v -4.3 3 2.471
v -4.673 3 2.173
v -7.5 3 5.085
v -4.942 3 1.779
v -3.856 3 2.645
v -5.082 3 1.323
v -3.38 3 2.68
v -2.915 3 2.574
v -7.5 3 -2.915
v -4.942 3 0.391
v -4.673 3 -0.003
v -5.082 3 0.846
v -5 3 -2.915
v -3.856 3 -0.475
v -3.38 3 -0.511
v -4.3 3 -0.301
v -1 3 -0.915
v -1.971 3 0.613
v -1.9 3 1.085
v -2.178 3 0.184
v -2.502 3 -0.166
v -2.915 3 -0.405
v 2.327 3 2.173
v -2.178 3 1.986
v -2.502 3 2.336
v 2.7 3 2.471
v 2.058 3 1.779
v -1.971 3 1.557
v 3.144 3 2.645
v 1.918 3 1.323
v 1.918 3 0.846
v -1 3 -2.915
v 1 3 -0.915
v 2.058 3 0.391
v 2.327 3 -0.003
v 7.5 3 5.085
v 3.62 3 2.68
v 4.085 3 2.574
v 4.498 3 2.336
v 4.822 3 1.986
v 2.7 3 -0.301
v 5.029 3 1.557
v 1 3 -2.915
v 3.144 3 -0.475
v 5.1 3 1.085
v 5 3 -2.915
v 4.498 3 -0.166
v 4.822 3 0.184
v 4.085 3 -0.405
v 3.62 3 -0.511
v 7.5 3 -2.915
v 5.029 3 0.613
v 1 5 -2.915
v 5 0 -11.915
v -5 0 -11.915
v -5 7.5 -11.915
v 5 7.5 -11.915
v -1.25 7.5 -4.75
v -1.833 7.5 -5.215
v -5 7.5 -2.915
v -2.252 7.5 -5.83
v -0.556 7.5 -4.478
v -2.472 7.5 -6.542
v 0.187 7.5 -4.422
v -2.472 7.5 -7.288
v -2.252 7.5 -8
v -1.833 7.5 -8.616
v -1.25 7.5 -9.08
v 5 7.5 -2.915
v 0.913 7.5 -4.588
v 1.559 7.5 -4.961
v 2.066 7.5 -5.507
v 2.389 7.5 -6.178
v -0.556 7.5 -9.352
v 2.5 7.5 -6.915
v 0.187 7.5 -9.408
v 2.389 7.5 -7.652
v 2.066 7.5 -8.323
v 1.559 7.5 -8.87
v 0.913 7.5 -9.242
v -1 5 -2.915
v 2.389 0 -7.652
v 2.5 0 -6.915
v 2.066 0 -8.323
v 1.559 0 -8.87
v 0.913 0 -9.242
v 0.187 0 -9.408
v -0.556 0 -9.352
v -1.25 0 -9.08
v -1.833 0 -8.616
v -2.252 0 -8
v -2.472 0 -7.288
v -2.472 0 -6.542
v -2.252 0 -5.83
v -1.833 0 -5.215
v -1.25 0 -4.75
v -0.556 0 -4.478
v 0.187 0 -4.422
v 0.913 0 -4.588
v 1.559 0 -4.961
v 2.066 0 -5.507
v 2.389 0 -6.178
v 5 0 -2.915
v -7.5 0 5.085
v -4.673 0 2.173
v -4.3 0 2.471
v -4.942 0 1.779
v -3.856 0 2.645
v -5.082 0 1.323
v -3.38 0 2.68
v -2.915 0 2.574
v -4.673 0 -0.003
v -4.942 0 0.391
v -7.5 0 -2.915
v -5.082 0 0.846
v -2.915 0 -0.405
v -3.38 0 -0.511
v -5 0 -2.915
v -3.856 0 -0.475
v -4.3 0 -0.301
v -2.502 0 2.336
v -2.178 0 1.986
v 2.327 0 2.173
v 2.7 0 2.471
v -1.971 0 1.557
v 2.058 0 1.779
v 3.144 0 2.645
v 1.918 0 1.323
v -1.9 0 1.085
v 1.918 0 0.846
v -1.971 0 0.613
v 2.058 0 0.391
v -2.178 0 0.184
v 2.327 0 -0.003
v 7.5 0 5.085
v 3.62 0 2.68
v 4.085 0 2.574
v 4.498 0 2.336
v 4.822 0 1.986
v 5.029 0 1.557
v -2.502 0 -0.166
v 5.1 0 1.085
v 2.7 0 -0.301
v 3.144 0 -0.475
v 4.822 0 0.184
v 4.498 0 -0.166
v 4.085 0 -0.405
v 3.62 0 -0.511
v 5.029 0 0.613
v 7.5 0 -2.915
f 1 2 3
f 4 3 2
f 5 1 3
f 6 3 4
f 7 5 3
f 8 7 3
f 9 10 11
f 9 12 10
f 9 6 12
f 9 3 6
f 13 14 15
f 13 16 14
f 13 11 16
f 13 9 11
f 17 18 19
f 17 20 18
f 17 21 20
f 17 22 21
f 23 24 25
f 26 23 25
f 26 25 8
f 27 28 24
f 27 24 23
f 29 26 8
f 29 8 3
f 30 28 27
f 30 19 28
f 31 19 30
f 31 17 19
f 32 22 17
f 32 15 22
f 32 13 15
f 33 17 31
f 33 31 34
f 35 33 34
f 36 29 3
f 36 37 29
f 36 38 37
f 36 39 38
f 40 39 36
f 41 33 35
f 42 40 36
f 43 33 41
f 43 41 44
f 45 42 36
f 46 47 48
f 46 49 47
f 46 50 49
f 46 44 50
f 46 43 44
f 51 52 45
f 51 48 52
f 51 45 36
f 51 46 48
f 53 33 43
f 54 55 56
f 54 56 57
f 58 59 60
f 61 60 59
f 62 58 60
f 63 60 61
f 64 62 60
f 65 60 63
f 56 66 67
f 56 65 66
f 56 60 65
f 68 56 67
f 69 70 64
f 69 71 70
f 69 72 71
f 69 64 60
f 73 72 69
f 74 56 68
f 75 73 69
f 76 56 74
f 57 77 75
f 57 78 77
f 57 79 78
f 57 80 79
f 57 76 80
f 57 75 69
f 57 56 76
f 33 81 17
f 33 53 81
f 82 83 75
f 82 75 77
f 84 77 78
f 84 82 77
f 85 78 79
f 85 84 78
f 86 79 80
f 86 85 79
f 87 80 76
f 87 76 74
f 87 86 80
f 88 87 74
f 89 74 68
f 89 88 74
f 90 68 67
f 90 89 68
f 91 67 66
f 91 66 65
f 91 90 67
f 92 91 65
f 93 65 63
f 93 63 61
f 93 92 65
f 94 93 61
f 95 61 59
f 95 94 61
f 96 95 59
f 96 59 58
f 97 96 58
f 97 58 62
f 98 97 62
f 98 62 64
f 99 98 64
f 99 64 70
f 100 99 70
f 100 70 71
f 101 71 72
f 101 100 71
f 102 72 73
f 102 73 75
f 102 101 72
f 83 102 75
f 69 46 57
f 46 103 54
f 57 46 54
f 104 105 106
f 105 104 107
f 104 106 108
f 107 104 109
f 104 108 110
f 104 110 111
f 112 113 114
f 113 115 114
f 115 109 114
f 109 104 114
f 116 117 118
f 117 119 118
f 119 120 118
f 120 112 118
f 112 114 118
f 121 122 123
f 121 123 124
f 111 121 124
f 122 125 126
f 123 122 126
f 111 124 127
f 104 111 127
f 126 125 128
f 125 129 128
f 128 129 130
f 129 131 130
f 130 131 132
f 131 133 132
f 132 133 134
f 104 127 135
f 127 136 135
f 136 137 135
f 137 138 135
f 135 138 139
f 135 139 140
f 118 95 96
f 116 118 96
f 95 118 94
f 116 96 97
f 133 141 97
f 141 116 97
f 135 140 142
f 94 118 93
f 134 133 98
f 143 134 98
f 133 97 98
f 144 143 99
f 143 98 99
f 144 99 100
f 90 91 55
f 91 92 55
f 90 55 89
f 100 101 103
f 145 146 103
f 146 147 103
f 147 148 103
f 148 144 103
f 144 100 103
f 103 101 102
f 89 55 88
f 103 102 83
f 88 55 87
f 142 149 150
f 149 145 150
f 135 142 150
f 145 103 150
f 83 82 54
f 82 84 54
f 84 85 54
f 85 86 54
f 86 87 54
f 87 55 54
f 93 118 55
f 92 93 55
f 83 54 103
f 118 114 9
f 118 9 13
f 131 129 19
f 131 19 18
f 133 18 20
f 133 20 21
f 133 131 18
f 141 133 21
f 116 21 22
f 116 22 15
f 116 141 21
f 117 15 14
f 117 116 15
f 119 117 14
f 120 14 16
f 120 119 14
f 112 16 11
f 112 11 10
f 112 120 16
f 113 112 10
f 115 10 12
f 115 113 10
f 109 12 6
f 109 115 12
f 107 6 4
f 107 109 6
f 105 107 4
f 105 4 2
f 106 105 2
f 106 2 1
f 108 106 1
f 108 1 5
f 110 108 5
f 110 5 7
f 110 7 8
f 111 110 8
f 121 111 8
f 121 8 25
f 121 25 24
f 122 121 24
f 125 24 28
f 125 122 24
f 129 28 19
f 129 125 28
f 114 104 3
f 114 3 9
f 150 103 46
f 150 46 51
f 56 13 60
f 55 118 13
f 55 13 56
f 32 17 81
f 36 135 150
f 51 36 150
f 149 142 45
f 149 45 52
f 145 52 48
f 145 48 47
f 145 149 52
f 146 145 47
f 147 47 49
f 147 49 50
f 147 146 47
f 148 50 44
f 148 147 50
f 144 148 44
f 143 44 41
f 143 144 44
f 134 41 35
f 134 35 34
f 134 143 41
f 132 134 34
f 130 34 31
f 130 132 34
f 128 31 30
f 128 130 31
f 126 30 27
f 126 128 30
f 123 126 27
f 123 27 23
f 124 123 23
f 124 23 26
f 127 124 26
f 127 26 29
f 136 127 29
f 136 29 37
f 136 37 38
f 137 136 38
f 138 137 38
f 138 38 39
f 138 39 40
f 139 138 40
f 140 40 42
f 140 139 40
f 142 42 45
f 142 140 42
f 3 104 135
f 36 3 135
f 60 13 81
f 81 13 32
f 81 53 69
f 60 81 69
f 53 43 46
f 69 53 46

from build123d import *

# Parameters (mm, degrees)
SKETCH1_W           = 15
SKETCH1_H           = 8
SKETCH1_R           = 1.6
BOSS_EXTRUDE1_DEPTH = 3
SKETCH2_W           = 10
SKETCH2_H           = 9
SKETCH2_R           = 2.5
BOSS_EXTRUDE2_DEPTH = 7.5
BOSS_EXTRUDE3_DEPTH = 1


with BuildPart() as part:
    # Sketch1 → Boss-Extrude1 (new body)
    with BuildSketch(Plane(origin=(0, 0, 0), x_dir=(1, 0, 0), z_dir=(0, 1, 0))):
        with Locations((0, -1.0848967)):
            Rectangle(SKETCH1_W, SKETCH1_H)
        with Locations((-3.5, -1.0848967)):
            Circle(SKETCH1_R, mode=Mode.SUBTRACT)
        with Locations((3.5, -1.0848967)):
            Circle(SKETCH1_R, mode=Mode.SUBTRACT)
    extrude(amount=BOSS_EXTRUDE1_DEPTH)

    # Sketch2 → Boss-Extrude2 (add)
    with BuildSketch(Plane(origin=(0, 0, 0), x_dir=(1, 0, 0), z_dir=(0, 1, 0))):
        with Locations((0, 7.4151033)):
            Rectangle(SKETCH2_W, SKETCH2_H)
        with Locations((0, 6.9151033)):
            Circle(SKETCH2_R, mode=Mode.SUBTRACT)
    extrude(amount=BOSS_EXTRUDE2_DEPTH)

    # Sketch4 → Boss-Extrude3 (add, symmetric)
    with BuildSketch(Plane(origin=(0, 0, 0), x_dir=(0, 0, -1), z_dir=(1, 0, 0))):
        Polygon((2.9151033, 5), (0.9151033, 3), (2.9151033, 3), align=None)
    extrude(amount=BOSS_EXTRUDE3_DEPTH, both=True)


solid = part.part
